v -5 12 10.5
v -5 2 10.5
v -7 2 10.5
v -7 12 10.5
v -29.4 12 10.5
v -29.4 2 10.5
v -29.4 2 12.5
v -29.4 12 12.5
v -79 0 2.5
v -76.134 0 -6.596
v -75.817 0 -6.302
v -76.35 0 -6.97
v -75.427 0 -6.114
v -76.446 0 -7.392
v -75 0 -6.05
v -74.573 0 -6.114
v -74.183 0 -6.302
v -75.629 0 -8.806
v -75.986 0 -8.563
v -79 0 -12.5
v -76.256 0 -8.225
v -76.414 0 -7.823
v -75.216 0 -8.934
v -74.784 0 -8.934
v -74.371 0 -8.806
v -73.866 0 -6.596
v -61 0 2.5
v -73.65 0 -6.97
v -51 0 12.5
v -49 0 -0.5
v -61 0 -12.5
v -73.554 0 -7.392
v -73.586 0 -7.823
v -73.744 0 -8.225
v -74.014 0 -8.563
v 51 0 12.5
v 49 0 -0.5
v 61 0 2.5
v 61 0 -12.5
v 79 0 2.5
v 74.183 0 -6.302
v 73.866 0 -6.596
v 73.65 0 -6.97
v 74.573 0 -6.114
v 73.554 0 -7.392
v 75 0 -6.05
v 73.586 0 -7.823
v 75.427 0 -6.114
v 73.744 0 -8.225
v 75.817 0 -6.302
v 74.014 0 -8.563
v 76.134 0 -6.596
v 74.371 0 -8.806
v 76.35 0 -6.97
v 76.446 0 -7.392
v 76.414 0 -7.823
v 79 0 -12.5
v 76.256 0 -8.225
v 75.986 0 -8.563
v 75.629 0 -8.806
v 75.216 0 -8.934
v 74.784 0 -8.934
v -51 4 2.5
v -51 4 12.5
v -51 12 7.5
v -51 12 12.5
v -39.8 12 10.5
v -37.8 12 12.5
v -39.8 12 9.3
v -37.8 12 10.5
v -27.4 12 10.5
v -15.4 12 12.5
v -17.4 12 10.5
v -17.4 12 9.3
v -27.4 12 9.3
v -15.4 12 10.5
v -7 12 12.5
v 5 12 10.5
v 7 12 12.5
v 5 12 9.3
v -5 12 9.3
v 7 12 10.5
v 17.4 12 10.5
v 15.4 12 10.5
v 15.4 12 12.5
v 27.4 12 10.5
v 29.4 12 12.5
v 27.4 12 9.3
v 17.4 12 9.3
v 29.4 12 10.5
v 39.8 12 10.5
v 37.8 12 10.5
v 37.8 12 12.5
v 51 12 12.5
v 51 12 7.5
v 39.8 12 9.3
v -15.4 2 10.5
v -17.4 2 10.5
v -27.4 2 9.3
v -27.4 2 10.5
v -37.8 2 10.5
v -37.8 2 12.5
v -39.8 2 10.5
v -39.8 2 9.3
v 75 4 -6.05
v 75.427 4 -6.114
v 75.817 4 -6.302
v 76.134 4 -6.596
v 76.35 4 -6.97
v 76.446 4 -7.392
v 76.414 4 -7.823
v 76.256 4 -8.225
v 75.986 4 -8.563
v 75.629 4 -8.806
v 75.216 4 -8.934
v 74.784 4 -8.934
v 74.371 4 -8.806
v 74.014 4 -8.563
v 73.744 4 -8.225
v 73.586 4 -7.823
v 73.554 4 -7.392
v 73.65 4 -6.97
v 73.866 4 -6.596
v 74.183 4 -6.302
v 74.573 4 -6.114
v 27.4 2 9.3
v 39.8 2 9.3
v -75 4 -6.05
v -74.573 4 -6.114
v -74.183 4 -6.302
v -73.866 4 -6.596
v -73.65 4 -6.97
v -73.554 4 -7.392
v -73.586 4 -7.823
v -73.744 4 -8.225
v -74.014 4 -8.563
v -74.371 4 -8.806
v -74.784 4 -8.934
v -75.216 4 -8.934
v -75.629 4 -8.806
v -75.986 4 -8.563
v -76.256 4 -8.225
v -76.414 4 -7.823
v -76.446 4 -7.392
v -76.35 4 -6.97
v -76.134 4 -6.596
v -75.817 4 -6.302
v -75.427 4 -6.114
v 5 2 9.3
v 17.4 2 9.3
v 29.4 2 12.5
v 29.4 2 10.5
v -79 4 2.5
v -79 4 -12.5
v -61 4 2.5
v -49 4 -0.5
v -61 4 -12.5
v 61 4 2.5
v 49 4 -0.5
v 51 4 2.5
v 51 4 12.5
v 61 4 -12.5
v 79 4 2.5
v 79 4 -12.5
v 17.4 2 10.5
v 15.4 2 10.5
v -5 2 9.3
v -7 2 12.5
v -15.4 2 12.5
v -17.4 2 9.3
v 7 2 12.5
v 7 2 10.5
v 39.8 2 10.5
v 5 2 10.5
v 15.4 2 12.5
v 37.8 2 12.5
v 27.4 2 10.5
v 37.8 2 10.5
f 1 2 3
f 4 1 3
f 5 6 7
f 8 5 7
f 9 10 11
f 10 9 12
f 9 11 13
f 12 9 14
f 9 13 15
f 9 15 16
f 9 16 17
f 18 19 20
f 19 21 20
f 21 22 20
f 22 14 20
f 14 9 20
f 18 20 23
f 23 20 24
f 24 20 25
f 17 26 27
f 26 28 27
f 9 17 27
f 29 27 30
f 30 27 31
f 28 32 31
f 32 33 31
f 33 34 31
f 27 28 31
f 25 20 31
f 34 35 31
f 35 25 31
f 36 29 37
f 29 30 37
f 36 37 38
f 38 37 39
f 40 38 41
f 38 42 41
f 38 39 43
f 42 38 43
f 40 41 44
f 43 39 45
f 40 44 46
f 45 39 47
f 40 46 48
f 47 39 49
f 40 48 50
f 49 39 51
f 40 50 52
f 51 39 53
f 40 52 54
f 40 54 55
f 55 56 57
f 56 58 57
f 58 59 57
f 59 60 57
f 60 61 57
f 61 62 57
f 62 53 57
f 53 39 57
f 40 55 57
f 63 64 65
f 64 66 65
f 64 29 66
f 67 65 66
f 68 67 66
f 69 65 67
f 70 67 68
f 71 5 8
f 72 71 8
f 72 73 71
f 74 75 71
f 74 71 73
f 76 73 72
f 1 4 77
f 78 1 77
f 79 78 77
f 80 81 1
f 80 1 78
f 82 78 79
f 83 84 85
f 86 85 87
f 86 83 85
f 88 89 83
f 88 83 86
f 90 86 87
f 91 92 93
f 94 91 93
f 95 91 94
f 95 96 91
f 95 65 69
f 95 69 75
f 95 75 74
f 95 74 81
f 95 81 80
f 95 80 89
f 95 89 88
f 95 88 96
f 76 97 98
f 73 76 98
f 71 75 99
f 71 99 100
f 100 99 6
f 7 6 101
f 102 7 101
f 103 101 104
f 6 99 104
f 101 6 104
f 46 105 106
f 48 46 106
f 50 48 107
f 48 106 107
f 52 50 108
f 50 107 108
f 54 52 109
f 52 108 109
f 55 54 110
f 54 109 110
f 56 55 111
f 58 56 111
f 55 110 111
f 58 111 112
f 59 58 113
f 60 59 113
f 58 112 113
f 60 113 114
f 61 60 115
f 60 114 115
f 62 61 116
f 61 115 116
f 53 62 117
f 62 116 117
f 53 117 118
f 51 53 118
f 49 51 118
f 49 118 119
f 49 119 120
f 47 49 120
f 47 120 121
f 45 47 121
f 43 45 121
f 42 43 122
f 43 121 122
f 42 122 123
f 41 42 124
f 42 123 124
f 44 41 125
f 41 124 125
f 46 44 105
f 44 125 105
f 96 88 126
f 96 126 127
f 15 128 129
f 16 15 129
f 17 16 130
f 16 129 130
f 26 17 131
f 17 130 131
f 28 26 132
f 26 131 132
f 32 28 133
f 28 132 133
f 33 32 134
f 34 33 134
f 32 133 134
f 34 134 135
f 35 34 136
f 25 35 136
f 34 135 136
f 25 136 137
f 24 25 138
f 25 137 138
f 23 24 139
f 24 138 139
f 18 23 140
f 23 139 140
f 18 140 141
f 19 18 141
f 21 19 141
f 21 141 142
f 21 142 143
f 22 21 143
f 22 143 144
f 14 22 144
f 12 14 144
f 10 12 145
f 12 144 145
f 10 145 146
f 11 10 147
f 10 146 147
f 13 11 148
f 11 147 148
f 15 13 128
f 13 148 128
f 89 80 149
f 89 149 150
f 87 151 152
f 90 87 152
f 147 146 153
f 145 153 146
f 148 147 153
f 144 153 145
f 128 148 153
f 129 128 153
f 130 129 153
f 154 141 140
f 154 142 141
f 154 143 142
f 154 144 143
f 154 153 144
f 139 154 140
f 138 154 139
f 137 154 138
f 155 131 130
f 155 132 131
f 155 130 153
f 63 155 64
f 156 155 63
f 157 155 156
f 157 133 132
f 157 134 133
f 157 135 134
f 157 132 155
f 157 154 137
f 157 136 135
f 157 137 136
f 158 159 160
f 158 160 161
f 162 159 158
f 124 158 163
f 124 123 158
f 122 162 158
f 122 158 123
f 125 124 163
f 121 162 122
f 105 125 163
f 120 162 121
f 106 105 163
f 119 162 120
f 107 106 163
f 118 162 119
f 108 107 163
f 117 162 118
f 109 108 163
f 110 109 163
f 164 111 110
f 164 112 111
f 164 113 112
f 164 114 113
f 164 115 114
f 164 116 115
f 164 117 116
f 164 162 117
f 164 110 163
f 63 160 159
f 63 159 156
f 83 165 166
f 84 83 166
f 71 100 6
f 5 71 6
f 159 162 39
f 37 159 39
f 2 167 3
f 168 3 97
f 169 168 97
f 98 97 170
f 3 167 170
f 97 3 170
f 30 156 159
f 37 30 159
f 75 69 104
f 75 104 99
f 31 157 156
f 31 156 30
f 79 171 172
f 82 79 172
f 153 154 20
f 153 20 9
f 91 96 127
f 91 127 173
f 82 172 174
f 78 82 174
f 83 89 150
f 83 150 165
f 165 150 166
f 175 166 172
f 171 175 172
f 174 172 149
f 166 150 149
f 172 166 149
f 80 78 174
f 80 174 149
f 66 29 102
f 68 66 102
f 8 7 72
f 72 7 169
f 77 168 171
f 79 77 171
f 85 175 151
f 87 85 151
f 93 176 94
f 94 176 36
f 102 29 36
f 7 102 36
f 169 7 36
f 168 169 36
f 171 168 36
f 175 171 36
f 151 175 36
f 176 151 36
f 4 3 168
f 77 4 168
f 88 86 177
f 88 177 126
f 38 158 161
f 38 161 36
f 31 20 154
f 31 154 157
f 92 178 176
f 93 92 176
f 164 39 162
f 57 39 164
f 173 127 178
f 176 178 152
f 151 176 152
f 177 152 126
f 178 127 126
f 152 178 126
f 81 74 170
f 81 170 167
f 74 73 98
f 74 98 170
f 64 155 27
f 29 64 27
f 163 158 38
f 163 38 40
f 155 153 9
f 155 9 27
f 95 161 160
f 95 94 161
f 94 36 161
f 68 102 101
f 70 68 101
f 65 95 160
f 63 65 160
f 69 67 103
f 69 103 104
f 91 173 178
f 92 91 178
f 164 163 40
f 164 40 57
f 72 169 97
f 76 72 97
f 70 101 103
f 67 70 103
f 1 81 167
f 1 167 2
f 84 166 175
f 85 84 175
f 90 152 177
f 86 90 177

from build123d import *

# Parameters (mm, degrees)
SKETCH_1_W          = 160
SKETCH_1_H          = 25
EXTRUDE_1_DEPTH     = 4
SKETCH_3_R          = 1.45
CUT_EXTRUDE_1_DEPTH = 4
SKETCH_5_W          = 102
SKETCH_5_H          = 10
EXTRUDE_2_DEPTH     = 8
SKETCH_6_W          = 29
SKETCH_6_H          = 10
CUT_EXTRUDE_2_DEPTH = 6
CHAMFER_1_SIZE      = 10
CUT_EXTRUDE_3_DEPTH = 10
CUT_EXTRUDE_4_DEPTH = 142
SKETCH_10_W         = 122
SKETCH_10_H         = 12
CUT_EXTRUDE_5_DEPTH = 142
CHAMFER_2_SIZE      = 12
SKETCH_11_W         = 15
SKETCH_11_H         = 4
CUT_EXTRUDE_6_DEPTH = 1
SKETCH_12_W         = 15
SKETCH_12_H         = 4
CUT_EXTRUDE_7_DEPTH = 1


with BuildPart() as part:
    # 草图1 → 凸台-拉伸1 (new body)
    with BuildSketch(Plane(origin=(0, 0, 0), x_dir=(1, 0, 0), z_dir=(0, 1, 0))):
        Rectangle(SKETCH_1_W, SKETCH_1_H)
    extrude(amount=EXTRUDE_1_DEPTH)

    # 草图3 → 切除-拉伸1 (cut)
    with BuildSketch(Plane(origin=(0, 4, 0), x_dir=(1, 0, 0), z_dir=(0, 1, 0))):
        with Locations(Location((-75, 7.5, 0), (0, 0, 270))):
            Circle(SKETCH_3_R)
        with Locations(Location((75, 7.5, 0), (0, 0, 270))):
            Circle(SKETCH_3_R)
    extrude(amount=-CUT_EXTRUDE_1_DEPTH, mode=Mode.SUBTRACT)

    # 草图5 → 凸台-拉伸2 (add)
    with BuildSketch(Plane(origin=(0, 4, 0), x_dir=(1, 0, 0), z_dir=(0, 1, 0))):
        with Locations((0, -7.5)):
            Rectangle(SKETCH_5_W, SKETCH_5_H)
    extrude(amount=EXTRUDE_2_DEPTH)

    # 草图6 → 切除-拉伸2 (cut)
    with BuildSketch(Plane(origin=(0, 4, 0), x_dir=(1, 0, 0), z_dir=(0, 1, 0))):
        with Locations((-65.5, -7.5)):
            Rectangle(SKETCH_6_W, SKETCH_6_H)
        with Locations((65.5, -7.5)):
            Rectangle(SKETCH_6_W, SKETCH_6_H)
    extrude(amount=-CUT_EXTRUDE_2_DEPTH, mode=Mode.SUBTRACT)

    # 倒角1
    chamfer_1_edges = [part.edges().sort_by_distance(p)[0] for p in [
        (51, 2, 2.5),
        (-51, 2, 2.5),
    ]]
    chamfer(chamfer_1_edges, length=CHAMFER_1_SIZE - 0.0001)  # a hair under: the kernel refuses the full size

    # 草图7 → 切除-拉伸3 (cut)
    with BuildSketch(Plane(origin=(0, 12, 0), x_dir=(1, 0, 0), z_dir=(0, 1, 0))):
        Polygon((-39.8, -9.3), (-27.4, -9.3), (-27.4, -10.5), (-29.4, -10.5), (-29.4, -12.5), (-37.8, -12.5), (-37.8, -10.5), (-39.8, -10.5), align=None)
        Polygon((-17.4, -9.3), (-5, -9.3), (-5, -10.5), (-7, -10.5), (-7, -12.5), (-15.4, -12.5), (-15.4, -10.5), (-17.4, -10.5), align=None)
        Polygon((5, -9.3), (17.4, -9.3), (17.4, -10.5), (15.4, -10.5), (15.4, -12.5), (7, -12.5), (7, -10.5), (5, -10.5), align=None)
        Polygon((27.4, -9.3), (39.8, -9.3), (39.8, -10.5), (37.8, -10.5), (37.8, -12.5), (29.4, -12.5), (29.4, -10.5), (27.4, -10.5), align=None)
    extrude(amount=-CUT_EXTRUDE_3_DEPTH, mode=Mode.SUBTRACT)

    # 草图9 → 切除-拉伸4 (cut)
    with BuildSketch(Plane.ZY.offset(51)):
        Polygon((7.5, 12), (2.5, 4), (2.5, 12), align=None)
    extrude(amount=-CUT_EXTRUDE_4_DEPTH, mode=Mode.SUBTRACT)

    # 草图10 → 切除-拉伸5 (cut)
    with BuildSketch(Plane(origin=(0, 4, 0), x_dir=(1, 0, 0), z_dir=(0, 1, 0))):
        with Locations((0, 6.5)):
            Rectangle(SKETCH_10_W, SKETCH_10_H)
    extrude(amount=-CUT_EXTRUDE_5_DEPTH, mode=Mode.SUBTRACT)

    # 倒角2
    chamfer_2_edges = [part.edges().sort_by_distance(p)[0] for p in [
        (-61, 2, -0.5),
        (61, 2, -0.5),
    ]]
    chamfer(chamfer_2_edges, length=CHAMFER_2_SIZE - 0.0001)  # a hair under: the kernel refuses the full size

    # 草图11 → 切除-拉伸6 (cut)
    with BuildSketch(Plane.ZY.offset(80)):
        with Locations((-5, 2)):
            Rectangle(SKETCH_11_W, SKETCH_11_H)
    extrude(amount=-CUT_EXTRUDE_6_DEPTH, mode=Mode.SUBTRACT)

    # 草图12 → 切除-拉伸7 (cut)
    with BuildSketch(Plane(origin=(80, 0, 0), x_dir=(0, 0, -1), z_dir=(1, 0, 0))):
        with Locations((5, 2)):
            Rectangle(SKETCH_12_W, SKETCH_12_H)
    extrude(amount=-CUT_EXTRUDE_7_DEPTH, mode=Mode.SUBTRACT)


solid = part.part
